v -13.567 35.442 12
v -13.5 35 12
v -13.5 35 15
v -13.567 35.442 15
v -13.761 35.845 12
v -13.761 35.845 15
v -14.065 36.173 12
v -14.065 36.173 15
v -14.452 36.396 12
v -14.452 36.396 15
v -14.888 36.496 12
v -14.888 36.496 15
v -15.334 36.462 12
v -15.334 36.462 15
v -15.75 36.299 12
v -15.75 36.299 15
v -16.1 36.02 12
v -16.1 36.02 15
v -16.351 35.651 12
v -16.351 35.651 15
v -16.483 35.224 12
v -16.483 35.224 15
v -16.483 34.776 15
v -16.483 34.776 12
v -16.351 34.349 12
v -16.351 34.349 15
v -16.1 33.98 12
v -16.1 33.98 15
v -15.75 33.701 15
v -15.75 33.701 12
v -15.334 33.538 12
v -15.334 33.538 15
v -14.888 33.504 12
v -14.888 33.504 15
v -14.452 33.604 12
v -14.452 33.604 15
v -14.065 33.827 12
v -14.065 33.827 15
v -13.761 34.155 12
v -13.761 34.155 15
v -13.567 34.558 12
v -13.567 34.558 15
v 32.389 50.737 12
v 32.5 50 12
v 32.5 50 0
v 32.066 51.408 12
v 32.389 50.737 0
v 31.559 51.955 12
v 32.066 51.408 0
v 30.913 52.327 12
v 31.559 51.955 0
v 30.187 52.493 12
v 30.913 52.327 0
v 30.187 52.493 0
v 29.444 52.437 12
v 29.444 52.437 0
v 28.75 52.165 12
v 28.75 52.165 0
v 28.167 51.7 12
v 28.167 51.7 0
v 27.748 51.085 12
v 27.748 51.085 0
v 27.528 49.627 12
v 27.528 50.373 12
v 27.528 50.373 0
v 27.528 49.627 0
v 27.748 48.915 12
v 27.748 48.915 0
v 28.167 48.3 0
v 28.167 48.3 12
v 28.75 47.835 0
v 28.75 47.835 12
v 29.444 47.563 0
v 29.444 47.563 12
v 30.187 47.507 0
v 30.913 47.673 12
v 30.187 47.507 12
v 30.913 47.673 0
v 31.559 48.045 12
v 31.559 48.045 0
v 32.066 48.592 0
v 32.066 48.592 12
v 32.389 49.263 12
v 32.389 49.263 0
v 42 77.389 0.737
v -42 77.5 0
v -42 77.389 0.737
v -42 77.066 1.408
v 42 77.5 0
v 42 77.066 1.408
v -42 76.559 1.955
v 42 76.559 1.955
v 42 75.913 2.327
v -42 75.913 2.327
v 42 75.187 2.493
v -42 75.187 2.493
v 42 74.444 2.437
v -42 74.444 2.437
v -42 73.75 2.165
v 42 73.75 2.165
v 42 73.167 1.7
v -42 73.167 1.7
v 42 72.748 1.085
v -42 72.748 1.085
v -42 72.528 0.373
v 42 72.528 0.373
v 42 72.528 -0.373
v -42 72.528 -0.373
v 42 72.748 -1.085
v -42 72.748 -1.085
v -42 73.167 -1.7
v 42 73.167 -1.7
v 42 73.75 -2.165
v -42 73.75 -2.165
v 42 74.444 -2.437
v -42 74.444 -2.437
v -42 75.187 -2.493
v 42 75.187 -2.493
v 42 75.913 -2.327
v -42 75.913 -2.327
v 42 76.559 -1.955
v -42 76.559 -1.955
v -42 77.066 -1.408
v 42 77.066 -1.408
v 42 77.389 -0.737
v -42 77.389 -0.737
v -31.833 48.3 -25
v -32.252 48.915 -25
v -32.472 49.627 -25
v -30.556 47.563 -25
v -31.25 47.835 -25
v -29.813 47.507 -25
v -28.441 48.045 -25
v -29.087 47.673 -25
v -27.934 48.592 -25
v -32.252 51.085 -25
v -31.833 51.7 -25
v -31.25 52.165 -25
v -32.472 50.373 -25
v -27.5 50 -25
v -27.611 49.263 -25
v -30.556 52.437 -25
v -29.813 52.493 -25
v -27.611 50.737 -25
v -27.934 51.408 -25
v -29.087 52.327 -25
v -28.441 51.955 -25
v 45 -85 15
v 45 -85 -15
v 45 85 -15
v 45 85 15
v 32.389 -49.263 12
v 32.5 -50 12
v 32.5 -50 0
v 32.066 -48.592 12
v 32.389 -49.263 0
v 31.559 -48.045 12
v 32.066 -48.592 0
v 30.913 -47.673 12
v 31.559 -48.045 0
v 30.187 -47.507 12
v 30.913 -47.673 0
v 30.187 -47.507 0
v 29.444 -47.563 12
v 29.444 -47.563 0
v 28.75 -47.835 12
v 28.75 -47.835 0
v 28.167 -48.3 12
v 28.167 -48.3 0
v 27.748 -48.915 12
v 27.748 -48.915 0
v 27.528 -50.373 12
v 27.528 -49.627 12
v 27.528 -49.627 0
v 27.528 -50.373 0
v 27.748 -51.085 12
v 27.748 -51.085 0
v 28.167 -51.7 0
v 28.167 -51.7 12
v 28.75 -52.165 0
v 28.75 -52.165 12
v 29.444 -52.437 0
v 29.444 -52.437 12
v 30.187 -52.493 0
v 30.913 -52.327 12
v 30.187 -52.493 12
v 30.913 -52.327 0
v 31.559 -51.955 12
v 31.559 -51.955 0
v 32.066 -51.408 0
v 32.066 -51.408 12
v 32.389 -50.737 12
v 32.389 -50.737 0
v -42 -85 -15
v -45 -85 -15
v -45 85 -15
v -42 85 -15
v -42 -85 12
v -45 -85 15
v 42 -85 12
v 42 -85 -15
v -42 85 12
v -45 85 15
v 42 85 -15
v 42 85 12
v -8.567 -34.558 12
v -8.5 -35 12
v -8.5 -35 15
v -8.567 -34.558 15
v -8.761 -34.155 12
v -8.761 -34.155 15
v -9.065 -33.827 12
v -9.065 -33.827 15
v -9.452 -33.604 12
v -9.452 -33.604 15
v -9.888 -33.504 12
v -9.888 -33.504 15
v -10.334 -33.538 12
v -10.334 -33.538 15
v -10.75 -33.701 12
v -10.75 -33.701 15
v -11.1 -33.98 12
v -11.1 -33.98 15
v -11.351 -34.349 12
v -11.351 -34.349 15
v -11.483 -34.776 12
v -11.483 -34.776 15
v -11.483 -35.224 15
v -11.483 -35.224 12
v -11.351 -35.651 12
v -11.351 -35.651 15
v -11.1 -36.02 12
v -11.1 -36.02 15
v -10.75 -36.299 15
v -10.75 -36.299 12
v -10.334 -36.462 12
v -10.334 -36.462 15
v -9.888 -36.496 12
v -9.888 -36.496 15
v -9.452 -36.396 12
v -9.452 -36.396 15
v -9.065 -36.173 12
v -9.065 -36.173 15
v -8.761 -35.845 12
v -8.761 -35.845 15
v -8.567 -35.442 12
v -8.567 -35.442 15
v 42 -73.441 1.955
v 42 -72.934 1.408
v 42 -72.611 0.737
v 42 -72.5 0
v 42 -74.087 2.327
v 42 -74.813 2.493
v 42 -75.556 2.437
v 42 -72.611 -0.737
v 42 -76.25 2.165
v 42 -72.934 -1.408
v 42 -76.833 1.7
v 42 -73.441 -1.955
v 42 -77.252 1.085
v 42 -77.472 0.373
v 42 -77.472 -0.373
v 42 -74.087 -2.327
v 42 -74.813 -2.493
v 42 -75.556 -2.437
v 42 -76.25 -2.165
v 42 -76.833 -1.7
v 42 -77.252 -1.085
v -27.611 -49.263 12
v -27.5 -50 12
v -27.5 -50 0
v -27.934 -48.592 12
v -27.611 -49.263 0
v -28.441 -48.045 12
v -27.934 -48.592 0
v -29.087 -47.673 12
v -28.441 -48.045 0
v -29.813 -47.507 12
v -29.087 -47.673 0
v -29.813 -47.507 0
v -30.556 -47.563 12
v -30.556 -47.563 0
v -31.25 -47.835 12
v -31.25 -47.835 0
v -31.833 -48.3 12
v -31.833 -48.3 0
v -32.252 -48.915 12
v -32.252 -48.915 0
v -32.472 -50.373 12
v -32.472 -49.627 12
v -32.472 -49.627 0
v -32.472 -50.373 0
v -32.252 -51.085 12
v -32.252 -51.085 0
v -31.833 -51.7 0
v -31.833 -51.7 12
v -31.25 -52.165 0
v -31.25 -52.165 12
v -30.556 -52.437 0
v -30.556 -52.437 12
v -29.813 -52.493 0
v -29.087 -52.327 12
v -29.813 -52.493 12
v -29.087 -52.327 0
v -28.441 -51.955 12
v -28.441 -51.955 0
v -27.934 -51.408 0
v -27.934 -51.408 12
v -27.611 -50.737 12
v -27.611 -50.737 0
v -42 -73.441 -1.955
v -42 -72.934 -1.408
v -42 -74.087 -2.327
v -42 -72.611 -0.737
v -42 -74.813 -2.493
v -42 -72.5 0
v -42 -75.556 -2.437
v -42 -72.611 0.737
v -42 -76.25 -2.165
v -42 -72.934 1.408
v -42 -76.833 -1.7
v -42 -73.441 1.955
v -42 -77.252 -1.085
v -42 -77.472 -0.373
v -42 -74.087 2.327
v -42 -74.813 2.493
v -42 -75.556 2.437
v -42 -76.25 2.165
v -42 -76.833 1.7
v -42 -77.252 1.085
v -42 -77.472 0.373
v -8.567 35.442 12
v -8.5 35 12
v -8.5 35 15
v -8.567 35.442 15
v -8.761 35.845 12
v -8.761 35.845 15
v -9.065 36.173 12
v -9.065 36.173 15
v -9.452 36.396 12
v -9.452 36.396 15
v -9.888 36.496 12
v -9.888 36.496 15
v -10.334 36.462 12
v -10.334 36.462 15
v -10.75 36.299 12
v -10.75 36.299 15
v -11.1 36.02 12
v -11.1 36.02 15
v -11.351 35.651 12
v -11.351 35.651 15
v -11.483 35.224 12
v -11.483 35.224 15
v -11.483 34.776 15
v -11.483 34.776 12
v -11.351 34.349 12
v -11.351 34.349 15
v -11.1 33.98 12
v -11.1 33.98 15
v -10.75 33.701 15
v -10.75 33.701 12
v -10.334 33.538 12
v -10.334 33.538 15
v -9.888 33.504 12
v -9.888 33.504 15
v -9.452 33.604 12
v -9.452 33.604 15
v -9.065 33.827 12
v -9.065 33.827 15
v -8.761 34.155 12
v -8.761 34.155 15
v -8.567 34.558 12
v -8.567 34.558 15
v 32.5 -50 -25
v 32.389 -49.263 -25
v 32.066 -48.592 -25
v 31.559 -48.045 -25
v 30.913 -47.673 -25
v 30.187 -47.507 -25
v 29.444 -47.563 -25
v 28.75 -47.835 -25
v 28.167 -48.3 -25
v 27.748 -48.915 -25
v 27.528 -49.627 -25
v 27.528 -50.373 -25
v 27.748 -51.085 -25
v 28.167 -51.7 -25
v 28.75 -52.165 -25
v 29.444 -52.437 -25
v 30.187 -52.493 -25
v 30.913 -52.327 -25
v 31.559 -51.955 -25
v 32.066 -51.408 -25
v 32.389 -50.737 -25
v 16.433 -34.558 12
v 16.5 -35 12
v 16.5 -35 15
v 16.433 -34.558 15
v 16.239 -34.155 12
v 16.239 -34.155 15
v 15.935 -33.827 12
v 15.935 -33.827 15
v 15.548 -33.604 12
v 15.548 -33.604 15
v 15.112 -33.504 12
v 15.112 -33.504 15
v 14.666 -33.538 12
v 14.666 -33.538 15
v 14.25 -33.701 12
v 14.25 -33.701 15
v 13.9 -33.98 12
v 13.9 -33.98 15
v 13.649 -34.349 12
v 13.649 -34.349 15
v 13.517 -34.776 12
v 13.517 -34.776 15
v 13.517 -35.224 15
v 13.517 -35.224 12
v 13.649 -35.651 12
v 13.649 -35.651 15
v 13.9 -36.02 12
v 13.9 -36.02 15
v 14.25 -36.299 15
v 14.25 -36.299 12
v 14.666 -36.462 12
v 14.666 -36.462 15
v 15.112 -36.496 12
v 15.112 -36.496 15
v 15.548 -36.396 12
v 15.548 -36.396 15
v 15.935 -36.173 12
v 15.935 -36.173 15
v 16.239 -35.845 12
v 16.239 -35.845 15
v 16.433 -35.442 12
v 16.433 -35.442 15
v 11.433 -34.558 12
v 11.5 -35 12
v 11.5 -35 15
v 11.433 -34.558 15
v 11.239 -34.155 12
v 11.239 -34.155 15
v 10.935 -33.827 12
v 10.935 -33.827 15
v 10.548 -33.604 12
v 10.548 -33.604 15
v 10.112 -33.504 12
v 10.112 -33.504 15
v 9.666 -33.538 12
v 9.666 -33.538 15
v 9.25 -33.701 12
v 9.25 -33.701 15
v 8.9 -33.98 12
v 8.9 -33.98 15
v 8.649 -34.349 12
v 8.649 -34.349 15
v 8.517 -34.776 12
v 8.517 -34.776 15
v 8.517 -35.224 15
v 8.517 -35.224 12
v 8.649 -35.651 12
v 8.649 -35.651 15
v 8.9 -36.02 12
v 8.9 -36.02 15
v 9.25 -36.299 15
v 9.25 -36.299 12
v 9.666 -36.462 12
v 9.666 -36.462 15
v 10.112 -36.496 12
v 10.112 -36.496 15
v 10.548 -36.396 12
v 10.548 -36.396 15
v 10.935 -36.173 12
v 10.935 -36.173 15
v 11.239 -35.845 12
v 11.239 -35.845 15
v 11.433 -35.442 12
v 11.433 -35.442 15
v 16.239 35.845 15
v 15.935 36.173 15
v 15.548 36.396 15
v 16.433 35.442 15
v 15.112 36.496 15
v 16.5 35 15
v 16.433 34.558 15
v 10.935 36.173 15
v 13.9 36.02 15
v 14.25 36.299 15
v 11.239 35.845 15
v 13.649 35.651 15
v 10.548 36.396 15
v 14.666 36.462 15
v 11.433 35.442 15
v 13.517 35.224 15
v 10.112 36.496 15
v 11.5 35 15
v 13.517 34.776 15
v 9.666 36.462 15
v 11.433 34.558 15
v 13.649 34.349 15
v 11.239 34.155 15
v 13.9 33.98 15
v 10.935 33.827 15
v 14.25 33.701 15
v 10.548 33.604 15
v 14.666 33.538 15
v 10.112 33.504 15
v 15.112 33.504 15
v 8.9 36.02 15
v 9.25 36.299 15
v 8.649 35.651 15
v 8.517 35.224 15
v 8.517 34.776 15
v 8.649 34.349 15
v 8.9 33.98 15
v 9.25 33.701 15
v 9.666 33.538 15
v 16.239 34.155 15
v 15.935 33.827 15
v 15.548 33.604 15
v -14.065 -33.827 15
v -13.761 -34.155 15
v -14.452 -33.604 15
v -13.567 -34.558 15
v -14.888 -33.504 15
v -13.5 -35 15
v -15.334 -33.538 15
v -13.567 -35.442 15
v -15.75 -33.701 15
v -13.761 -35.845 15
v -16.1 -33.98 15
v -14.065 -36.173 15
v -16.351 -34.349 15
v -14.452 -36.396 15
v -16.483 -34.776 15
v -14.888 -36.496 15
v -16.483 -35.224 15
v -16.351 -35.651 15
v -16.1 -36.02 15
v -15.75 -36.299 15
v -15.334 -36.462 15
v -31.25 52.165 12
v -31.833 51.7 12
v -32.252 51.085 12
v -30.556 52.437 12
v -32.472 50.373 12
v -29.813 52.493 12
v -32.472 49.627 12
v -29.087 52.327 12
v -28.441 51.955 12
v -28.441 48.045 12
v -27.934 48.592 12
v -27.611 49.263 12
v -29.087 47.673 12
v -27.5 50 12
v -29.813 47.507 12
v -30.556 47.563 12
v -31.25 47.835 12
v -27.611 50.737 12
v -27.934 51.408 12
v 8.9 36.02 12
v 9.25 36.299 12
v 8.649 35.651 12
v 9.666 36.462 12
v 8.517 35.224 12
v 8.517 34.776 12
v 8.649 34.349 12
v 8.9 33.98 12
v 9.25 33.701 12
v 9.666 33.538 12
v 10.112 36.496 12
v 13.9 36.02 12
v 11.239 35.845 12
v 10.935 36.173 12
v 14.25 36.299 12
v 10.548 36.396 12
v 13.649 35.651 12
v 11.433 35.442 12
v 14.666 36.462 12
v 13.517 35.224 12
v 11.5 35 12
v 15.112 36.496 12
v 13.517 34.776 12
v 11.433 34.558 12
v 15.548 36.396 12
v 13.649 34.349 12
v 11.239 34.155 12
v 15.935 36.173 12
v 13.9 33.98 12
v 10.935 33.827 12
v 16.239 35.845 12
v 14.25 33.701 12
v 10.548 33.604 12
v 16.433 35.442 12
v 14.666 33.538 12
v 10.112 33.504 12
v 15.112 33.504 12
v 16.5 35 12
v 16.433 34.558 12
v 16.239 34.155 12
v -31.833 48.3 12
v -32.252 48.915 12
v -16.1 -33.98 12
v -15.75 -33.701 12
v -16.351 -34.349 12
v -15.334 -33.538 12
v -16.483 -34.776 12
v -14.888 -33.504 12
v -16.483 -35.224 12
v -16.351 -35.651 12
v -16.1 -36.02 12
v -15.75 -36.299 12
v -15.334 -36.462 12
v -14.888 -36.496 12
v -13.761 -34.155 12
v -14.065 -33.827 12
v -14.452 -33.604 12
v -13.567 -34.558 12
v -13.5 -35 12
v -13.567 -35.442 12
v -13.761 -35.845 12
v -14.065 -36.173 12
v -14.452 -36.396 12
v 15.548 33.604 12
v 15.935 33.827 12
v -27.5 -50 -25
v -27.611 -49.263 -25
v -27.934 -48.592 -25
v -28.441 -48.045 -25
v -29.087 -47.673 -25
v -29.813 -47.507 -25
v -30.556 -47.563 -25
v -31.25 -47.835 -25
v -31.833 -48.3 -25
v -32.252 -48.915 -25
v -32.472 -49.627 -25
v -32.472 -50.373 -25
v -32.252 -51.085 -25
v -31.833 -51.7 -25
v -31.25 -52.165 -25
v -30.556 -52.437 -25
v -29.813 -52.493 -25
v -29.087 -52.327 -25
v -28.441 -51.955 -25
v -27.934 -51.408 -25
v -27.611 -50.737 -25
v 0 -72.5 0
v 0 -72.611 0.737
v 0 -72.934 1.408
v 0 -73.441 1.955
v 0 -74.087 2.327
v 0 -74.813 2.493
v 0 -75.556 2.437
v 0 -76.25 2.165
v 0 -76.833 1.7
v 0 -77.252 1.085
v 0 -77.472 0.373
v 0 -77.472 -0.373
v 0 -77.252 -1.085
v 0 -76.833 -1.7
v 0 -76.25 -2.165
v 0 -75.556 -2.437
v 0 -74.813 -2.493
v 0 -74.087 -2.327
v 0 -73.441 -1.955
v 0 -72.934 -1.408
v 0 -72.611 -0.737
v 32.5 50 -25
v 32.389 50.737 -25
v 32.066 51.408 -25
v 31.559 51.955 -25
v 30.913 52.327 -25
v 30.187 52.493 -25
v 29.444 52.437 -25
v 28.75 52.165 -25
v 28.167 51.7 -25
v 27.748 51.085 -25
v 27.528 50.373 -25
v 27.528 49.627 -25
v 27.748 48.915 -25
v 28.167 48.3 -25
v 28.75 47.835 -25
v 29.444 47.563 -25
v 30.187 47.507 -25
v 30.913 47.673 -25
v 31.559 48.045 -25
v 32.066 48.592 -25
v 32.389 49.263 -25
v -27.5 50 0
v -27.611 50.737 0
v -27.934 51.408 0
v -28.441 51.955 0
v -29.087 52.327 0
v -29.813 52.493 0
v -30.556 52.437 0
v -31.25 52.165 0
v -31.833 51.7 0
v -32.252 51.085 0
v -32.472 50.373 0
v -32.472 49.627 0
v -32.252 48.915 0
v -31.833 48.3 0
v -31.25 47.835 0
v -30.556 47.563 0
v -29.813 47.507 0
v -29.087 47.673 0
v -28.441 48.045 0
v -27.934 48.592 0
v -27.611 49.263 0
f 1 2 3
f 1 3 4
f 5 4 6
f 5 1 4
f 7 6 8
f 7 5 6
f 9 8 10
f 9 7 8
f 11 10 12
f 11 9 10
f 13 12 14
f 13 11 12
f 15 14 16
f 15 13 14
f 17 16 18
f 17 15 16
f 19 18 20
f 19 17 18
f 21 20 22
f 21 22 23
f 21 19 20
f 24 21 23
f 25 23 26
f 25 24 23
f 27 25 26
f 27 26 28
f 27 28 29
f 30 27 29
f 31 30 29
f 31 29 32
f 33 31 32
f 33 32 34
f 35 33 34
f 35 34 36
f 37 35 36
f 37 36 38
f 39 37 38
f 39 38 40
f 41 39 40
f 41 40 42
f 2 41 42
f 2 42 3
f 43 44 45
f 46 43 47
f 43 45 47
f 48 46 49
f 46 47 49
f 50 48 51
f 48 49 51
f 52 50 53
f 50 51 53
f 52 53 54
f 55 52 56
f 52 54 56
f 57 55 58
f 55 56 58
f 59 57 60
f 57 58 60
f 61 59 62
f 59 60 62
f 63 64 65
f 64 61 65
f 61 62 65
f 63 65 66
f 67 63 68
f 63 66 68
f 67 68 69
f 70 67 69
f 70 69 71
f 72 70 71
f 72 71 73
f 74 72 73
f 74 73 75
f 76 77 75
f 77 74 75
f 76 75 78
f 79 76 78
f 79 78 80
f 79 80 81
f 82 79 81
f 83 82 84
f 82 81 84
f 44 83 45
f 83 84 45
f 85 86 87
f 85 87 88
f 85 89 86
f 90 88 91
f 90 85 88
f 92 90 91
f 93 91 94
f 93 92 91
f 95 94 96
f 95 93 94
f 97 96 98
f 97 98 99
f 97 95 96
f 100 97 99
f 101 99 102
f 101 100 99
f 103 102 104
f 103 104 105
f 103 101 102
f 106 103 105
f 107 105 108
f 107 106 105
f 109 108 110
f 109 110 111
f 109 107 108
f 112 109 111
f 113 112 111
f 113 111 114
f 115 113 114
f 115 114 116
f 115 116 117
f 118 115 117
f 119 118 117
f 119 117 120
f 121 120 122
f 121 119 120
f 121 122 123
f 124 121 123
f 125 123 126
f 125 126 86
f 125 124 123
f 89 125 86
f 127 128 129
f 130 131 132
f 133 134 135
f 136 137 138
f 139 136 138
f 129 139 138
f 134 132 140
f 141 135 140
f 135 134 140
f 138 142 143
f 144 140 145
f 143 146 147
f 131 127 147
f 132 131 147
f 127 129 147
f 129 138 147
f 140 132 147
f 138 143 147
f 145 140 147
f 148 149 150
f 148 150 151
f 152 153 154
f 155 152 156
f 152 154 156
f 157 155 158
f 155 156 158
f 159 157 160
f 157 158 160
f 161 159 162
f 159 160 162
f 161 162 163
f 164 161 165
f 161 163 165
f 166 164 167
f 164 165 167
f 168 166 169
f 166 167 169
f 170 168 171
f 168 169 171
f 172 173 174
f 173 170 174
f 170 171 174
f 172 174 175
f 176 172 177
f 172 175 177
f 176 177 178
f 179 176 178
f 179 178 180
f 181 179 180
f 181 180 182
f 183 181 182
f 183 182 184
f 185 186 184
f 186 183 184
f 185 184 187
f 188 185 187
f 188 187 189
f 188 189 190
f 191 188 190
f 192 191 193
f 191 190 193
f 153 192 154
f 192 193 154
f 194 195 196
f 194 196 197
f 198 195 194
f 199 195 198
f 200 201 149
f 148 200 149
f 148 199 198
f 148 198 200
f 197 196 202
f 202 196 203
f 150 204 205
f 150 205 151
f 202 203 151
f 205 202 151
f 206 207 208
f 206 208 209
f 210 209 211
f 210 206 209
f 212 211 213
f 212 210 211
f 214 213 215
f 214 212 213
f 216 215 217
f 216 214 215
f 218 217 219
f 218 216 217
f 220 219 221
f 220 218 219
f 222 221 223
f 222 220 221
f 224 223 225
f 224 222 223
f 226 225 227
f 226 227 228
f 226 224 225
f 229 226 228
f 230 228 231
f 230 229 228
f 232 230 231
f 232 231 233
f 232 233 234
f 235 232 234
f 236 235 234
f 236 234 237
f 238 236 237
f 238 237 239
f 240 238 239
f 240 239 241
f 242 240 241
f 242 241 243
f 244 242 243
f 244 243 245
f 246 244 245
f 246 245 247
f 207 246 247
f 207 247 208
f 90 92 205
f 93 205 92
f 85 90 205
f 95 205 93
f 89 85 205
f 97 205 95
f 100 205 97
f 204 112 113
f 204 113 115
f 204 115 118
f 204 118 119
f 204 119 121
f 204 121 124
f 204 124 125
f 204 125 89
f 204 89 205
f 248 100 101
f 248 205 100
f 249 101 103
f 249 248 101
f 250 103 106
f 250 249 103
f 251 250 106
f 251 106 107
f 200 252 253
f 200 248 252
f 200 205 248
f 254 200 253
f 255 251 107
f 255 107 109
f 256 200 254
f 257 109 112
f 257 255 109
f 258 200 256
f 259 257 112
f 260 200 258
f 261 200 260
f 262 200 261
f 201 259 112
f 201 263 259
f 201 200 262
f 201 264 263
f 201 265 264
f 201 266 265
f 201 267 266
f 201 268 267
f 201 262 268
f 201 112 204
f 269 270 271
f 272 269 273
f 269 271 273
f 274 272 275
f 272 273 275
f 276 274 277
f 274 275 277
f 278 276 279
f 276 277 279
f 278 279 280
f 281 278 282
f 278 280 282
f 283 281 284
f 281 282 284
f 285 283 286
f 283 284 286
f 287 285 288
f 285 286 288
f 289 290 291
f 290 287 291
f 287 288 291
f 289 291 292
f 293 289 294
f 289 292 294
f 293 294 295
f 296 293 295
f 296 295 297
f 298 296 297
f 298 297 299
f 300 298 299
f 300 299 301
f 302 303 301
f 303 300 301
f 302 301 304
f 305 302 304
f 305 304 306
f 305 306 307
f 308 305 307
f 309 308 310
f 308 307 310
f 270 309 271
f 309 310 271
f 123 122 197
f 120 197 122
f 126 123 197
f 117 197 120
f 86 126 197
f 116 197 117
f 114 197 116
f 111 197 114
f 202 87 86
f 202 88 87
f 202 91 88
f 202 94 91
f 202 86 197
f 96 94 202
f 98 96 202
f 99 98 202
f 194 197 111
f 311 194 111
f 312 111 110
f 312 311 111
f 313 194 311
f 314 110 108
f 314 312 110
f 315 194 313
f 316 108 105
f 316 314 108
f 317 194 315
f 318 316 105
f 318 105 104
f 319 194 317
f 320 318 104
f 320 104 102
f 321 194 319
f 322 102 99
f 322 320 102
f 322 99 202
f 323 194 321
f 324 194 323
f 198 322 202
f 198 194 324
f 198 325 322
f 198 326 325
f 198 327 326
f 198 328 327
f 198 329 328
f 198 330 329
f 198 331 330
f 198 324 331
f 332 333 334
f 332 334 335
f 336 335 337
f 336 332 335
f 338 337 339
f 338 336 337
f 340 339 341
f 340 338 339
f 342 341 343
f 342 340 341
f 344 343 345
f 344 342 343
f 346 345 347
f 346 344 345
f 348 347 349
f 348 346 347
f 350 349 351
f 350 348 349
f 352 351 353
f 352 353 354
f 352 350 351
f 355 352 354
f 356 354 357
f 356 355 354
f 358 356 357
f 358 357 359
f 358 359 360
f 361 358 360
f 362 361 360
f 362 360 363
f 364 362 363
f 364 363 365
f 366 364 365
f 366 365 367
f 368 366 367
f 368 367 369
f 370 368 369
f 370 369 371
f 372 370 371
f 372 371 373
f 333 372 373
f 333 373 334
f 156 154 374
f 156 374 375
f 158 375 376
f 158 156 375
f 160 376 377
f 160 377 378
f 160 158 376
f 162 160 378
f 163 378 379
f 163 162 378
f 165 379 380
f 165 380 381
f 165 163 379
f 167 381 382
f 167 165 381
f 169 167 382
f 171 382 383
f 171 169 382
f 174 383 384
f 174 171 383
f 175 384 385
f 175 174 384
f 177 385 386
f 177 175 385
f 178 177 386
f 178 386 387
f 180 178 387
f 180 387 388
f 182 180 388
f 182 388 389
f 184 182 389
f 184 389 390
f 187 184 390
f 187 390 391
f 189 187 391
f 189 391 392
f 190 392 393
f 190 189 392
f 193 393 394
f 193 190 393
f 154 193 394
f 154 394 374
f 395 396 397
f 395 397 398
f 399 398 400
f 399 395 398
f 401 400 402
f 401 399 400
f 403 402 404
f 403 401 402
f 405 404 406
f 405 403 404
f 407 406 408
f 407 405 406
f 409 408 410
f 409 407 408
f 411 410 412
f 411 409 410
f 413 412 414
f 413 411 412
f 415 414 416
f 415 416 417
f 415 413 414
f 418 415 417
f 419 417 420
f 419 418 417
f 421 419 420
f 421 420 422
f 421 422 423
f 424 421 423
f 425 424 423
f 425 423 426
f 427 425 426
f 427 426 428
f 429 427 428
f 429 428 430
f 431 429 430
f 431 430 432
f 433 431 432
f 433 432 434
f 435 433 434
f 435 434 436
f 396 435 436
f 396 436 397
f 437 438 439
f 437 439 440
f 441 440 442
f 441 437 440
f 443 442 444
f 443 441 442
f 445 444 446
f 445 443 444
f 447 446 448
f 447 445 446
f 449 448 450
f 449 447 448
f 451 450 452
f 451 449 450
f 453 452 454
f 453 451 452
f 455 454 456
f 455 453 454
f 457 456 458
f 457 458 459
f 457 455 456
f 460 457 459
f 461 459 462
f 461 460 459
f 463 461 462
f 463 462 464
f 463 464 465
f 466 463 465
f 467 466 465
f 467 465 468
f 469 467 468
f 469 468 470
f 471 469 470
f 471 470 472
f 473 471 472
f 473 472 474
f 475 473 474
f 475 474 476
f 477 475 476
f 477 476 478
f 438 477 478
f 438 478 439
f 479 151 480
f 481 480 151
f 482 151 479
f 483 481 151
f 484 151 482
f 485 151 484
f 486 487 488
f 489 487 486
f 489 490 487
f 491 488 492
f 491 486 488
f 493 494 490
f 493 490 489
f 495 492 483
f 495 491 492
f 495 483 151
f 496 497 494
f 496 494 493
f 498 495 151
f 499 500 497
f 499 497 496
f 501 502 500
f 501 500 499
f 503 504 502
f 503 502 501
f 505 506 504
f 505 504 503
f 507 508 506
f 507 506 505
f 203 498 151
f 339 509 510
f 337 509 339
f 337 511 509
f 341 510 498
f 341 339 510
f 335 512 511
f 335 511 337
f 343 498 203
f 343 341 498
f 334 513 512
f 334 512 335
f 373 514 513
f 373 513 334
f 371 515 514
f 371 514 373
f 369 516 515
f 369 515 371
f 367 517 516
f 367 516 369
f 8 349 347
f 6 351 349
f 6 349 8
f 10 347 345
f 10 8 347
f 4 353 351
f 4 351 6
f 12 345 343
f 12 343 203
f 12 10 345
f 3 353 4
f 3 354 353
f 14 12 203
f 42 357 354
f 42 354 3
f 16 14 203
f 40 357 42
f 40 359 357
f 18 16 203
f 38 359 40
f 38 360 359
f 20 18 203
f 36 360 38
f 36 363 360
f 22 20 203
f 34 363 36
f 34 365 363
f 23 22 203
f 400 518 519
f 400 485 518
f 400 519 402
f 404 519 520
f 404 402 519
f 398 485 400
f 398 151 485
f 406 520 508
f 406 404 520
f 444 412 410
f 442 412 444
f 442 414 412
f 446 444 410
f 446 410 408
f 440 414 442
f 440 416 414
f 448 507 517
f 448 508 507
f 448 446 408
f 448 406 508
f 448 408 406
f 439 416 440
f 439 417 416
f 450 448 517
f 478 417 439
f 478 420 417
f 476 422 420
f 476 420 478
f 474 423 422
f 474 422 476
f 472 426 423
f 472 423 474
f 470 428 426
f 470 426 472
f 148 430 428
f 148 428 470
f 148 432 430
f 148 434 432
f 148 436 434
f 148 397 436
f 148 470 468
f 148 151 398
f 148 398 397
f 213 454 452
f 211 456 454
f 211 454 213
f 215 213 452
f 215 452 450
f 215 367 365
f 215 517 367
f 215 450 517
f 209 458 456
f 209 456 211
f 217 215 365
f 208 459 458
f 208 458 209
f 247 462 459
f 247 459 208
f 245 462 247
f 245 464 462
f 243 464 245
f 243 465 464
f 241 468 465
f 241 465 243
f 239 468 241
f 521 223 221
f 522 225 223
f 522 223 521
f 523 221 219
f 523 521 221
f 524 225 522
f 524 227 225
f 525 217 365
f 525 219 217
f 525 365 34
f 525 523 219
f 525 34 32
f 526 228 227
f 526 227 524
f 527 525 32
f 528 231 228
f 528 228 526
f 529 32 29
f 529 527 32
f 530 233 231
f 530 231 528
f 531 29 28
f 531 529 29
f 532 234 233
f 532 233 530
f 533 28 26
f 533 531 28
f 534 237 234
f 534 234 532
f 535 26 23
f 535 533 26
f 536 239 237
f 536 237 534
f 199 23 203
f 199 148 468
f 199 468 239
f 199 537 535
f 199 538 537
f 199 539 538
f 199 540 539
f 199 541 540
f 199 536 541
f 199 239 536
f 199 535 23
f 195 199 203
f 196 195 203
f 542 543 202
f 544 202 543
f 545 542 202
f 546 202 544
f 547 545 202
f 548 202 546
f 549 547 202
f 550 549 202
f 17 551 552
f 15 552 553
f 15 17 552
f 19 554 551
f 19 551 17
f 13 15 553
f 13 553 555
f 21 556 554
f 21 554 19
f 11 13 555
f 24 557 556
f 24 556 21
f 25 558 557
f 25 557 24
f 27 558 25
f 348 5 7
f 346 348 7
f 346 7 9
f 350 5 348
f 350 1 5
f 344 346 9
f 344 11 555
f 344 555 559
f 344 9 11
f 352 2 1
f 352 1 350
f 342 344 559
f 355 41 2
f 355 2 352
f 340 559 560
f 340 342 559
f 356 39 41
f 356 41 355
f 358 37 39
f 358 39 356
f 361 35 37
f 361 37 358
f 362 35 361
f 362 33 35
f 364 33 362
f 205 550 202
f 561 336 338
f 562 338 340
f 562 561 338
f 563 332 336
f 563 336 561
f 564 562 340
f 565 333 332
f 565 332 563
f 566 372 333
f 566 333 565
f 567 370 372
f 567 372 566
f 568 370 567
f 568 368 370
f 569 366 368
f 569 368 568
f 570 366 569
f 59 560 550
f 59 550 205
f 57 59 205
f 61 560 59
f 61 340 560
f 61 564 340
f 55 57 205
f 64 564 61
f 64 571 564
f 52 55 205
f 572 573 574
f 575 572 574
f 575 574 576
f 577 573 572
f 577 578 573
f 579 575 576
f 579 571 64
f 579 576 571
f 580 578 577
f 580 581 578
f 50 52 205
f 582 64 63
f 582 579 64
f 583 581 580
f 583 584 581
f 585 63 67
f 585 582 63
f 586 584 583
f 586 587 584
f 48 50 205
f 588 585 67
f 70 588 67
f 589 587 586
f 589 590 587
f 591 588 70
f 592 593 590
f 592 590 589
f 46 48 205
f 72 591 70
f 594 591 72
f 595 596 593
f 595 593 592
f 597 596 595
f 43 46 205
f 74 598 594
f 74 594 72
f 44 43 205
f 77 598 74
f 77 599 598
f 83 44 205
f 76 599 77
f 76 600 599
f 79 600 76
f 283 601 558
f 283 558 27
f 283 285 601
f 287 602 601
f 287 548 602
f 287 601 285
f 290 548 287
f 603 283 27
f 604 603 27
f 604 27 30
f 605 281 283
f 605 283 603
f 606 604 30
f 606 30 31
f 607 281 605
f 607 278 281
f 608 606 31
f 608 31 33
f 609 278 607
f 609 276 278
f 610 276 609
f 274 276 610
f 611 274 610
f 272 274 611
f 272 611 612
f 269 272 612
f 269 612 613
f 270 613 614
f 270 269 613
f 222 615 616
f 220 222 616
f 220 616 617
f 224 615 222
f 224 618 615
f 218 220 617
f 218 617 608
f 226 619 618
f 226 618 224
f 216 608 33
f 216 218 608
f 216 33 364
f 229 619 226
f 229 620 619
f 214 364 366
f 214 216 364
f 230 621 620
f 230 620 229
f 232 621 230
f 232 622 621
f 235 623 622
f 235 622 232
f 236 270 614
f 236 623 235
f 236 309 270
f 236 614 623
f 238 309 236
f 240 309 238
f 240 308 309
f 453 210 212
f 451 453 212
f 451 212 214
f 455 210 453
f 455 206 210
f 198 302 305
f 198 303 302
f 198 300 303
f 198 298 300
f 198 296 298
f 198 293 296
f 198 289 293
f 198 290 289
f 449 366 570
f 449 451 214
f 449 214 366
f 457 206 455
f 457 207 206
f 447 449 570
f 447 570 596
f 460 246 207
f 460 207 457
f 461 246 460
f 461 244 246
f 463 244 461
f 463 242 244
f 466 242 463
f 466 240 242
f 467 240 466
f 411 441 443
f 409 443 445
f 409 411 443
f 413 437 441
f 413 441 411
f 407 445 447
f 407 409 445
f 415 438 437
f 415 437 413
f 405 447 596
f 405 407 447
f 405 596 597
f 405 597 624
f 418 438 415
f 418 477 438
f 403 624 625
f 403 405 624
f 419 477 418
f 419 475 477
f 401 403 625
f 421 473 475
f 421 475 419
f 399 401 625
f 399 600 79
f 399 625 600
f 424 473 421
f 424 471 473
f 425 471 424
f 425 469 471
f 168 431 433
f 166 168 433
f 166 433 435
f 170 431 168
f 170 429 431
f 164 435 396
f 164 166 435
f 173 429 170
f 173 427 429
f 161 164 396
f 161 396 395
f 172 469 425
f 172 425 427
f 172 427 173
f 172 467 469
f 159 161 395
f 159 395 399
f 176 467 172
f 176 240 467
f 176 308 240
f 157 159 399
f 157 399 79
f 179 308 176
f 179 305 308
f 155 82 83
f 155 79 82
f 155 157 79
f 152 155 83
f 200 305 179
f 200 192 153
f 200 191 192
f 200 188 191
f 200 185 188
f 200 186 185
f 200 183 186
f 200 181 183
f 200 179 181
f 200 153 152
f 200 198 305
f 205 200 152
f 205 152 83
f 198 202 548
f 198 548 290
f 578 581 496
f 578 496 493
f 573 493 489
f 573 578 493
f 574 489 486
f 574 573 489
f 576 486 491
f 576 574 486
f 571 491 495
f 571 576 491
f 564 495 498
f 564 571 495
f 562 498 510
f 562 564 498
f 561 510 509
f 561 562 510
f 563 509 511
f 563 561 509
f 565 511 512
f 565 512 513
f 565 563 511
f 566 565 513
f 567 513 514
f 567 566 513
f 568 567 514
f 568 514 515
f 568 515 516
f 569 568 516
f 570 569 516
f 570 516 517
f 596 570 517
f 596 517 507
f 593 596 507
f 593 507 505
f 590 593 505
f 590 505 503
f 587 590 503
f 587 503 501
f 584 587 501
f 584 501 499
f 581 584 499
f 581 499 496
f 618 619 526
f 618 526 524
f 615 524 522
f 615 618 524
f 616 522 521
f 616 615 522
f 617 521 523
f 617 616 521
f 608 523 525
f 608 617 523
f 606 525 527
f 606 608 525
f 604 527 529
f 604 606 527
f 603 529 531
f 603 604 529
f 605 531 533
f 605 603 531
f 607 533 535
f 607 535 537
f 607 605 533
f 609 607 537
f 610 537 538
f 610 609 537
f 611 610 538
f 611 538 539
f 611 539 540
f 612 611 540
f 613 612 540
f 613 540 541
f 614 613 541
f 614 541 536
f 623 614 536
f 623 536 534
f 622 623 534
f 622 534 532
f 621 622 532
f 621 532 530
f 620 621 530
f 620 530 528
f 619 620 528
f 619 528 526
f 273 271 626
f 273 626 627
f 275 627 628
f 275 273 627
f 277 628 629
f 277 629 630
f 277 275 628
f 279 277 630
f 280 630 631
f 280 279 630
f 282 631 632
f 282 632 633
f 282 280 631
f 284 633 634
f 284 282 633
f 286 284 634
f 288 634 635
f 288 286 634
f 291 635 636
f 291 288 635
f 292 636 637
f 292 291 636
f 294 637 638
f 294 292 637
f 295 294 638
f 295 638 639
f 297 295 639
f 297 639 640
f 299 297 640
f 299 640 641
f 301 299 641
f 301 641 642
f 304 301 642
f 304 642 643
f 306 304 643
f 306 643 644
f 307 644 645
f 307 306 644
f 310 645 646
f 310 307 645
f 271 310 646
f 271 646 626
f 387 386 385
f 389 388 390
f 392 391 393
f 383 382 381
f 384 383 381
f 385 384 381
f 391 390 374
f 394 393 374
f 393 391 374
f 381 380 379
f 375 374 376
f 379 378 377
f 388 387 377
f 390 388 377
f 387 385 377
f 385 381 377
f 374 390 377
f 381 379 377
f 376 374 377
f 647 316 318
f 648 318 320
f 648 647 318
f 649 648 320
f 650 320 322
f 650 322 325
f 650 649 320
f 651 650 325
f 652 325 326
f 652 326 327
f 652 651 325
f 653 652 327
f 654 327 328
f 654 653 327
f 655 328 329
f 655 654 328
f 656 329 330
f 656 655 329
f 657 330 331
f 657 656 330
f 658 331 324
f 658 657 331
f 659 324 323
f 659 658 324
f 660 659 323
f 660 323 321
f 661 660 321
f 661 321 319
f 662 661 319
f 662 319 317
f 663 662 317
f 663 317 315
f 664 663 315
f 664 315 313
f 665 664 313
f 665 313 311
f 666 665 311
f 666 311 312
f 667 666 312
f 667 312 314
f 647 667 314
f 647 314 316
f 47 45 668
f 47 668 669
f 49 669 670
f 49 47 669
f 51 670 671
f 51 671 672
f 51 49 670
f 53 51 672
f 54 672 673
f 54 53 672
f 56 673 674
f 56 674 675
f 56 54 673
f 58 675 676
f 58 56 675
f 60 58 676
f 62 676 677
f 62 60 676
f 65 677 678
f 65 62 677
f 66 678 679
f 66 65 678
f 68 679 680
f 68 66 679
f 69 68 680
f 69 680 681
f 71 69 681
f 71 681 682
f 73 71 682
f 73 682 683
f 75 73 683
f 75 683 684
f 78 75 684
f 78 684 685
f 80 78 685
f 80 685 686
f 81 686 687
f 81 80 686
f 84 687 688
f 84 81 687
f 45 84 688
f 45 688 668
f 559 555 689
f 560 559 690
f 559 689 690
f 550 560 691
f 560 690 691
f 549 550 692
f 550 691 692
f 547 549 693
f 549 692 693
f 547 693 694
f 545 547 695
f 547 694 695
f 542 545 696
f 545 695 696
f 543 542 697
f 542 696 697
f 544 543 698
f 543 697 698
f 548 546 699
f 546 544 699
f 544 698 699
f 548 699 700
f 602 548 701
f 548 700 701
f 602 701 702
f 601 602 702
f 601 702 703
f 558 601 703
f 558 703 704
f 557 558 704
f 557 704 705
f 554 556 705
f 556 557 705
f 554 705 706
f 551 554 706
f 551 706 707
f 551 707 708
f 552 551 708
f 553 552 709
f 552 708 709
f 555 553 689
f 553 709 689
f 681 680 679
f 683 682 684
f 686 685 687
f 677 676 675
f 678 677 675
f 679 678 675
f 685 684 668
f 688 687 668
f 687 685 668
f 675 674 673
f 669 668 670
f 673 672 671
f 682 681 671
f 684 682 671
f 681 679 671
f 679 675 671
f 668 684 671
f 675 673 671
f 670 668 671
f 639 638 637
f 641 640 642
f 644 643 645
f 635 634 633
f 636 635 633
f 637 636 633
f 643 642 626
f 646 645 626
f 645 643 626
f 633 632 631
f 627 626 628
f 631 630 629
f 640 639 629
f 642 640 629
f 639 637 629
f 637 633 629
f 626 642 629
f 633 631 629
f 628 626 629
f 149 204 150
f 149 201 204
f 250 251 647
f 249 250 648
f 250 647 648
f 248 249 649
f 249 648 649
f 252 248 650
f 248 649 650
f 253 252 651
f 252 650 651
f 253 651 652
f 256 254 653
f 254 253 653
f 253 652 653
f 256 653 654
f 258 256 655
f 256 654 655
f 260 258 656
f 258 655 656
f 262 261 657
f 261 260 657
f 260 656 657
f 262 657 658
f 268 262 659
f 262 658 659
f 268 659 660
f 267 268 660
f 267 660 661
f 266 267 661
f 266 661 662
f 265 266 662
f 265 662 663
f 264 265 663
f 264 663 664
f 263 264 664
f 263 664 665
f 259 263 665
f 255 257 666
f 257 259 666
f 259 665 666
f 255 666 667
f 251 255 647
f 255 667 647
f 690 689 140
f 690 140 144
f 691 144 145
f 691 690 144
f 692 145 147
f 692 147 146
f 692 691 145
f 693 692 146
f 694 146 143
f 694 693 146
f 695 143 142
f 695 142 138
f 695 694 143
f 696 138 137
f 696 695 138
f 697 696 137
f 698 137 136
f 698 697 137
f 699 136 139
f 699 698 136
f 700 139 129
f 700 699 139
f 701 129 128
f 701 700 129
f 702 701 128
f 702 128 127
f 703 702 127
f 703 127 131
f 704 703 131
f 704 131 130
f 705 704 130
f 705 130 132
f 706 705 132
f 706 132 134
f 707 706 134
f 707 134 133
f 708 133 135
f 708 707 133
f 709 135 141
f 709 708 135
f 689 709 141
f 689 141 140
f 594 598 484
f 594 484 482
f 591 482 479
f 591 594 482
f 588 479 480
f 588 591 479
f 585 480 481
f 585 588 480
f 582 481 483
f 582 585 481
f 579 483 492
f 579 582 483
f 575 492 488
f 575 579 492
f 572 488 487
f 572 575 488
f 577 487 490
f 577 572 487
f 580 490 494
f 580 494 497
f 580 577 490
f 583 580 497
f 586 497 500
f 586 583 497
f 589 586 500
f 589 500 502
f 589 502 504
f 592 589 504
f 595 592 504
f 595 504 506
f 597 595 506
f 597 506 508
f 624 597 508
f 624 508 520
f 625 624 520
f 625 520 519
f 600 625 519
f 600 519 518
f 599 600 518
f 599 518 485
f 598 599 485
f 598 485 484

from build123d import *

# Parameters (mm, degrees)
F1_DEPTH      = 85
F2_R          = 2.5
F3_DEPTH      = 45
F4_R          = 2.5
F5_DEPTH      = 15
F5_DEPTH_BACK = 25
F6_R          = 1.5
F7_DEPTH      = 15


with BuildPart() as f1:
    # F0 (on Front) → F1 (new body, symmetric)
    with BuildSketch(Plane.XZ):
        Polygon((42, -15), (45, -15), (45, 15), (-45, 15), (-45, -15), (-42, -15), (-42, 12), (42, 12), align=None)
    extrude(amount=F1_DEPTH, both=True)

    # F2 (on Right) → F3 (join, symmetric)
    with BuildSketch(Plane.YZ):
        with Locations((-75, 0)):
            Circle(F2_R)
        with Locations((75, 0)):
            Circle(F2_R)
    extrude(amount=F3_DEPTH, both=True)

    # F4 (on Top) → F5 (join, two sides)
    with BuildSketch(Plane.XY) as f5_sk:
        with Locations((-30, -50)):
            Circle(F4_R)
        with Locations((30, -50)):
            Circle(F4_R)
        with Locations((30, 50)):
            Circle(F4_R)
        with Locations((-30, 50)):
            Circle(F4_R)
    extrude(amount=F5_DEPTH)
    extrude(f5_sk.sketch, amount=-F5_DEPTH_BACK)

    # F6 (on Top) → F7 (cut)
    with BuildSketch(Plane.XY):
        with Locations((-10, 35)):
            Circle(F6_R)
        with Locations((10, 35)):
            Circle(F6_R)
        with Locations((10, -35)):
            Circle(F6_R)
        with Locations((-10, -35)):
            Circle(F6_R)
        with Locations((-15, 35)):
            Circle(F6_R)
        with Locations((15, 35)):
            Circle(F6_R)
        with Locations((15, -35)):
            Circle(F6_R)
        with Locations((-15, -35)):
            Circle(F6_R)
    extrude(amount=F7_DEPTH, mode=Mode.SUBTRACT)


solid = f1.part
